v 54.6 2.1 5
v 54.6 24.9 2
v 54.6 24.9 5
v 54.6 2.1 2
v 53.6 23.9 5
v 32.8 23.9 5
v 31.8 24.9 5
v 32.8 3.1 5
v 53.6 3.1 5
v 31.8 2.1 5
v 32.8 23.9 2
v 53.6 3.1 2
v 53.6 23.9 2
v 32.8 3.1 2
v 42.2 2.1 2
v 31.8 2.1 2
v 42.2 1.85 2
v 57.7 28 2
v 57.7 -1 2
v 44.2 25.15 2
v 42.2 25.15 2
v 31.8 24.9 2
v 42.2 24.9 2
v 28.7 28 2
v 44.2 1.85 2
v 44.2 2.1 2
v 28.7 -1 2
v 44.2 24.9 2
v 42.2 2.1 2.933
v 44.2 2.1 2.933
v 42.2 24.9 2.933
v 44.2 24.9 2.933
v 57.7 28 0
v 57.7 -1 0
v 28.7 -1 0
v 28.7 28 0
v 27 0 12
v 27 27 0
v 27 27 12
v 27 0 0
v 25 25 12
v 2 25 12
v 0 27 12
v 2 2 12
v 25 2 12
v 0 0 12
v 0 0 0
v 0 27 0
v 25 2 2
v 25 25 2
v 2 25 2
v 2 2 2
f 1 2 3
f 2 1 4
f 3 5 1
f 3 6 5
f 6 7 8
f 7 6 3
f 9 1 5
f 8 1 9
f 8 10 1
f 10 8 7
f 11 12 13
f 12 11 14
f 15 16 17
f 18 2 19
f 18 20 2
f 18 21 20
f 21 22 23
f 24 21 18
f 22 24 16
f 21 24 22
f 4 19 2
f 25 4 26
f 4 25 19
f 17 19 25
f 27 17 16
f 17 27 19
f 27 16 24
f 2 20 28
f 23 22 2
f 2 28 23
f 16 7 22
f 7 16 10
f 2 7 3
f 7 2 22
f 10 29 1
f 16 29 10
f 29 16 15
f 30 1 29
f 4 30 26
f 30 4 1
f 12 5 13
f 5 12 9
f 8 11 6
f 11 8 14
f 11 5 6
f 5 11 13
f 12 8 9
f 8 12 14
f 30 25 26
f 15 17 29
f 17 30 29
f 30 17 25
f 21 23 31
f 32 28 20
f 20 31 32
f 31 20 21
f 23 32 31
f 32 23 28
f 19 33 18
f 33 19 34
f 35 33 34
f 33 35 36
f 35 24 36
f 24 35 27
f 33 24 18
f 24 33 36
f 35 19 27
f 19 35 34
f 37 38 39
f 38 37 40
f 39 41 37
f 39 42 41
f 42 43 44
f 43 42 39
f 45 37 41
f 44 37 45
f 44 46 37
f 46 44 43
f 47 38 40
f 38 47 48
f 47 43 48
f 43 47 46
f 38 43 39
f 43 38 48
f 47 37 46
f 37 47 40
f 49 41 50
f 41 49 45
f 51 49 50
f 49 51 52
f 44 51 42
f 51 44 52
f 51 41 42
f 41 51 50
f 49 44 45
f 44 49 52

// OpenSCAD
thickness = 2;
lip = 1;
outside = 27;
height = 12;


module box() {
  inside = outside - 2 * thickness;
  difference () {
    cube([outside, outside, height], false);
    // union () {
      translate([thickness, thickness, thickness]) 
        cube([inside, inside, height], false);
    //   translate([lip, lip, height - 2 * lip])
    //     cube([outside - 2 * lip, outside - 2 * lip, lip], false);
    // };
  };
};


module bump (size, rot) {
  rotate([0,0,90*rot]) { 
    intersection() {
      sphere(size, $fn=20);
      translate ([size * 2,0,0]) cube([size*4,size*4,size*4], true);
    };
};
};


module wedge () {
  base = thickness / 8;
  translate ([-thickness / 2, -base, 0])
    intersection () {
      rotate ([-15, 0, 0]) cube ([thickness, thickness / 2, thickness], false);
      cube ([thickness, base, thickness], false);
  };
};

wiggle = 0.1;
module lid() {
  // How far to shift the lip
  lip_gap = thickness + wiggle;
  // Diameter of lip
  lip_size = outside - 2 * lip_gap;
  // bump_size = lip - wiggle;
  
  // The base of the lid  
  translate ([-thickness / 2, -thickness / 2, 0]) 
    cube([outside + thickness, outside + thickness, thickness], false);
    
  // The lip
  difference () {
    translate([lip_gap, lip_gap, thickness]) 
      cube([lip_size, lip_size, thickness + lip], false);
    translate([lip_gap + lip, lip_gap + lip, thickness]) 
      cube([lip_size - 2 * lip, lip_size - 2 * lip, thickness + lip], false);
      
  };

  // A locking wedge
  translate([outside / 2, lip_gap, thickness]) wedge();
  translate([outside / 2, lip_gap + lip_size, thickness]) rotate([0,0,180]) wedge();
  
  bump_h = 1.5 * thickness + lip;
  // translate ([outside - lip_gap, outside / 2, bump_h]) {bump(bump_size, 0);};
  // translate ([outside / 2, outside - lip_gap, bump_h]) {bump(bump_size, 1);};
  // translate ([lip_gap, outside / 2, bump_h]) {bump(bump_size, 2);};
  // translate ([outside / 2, lip_gap, bump_h]) {bump(bump_size, 3);};

};


translate ([1.1 * outside, 0, 0]) lid();
box();
